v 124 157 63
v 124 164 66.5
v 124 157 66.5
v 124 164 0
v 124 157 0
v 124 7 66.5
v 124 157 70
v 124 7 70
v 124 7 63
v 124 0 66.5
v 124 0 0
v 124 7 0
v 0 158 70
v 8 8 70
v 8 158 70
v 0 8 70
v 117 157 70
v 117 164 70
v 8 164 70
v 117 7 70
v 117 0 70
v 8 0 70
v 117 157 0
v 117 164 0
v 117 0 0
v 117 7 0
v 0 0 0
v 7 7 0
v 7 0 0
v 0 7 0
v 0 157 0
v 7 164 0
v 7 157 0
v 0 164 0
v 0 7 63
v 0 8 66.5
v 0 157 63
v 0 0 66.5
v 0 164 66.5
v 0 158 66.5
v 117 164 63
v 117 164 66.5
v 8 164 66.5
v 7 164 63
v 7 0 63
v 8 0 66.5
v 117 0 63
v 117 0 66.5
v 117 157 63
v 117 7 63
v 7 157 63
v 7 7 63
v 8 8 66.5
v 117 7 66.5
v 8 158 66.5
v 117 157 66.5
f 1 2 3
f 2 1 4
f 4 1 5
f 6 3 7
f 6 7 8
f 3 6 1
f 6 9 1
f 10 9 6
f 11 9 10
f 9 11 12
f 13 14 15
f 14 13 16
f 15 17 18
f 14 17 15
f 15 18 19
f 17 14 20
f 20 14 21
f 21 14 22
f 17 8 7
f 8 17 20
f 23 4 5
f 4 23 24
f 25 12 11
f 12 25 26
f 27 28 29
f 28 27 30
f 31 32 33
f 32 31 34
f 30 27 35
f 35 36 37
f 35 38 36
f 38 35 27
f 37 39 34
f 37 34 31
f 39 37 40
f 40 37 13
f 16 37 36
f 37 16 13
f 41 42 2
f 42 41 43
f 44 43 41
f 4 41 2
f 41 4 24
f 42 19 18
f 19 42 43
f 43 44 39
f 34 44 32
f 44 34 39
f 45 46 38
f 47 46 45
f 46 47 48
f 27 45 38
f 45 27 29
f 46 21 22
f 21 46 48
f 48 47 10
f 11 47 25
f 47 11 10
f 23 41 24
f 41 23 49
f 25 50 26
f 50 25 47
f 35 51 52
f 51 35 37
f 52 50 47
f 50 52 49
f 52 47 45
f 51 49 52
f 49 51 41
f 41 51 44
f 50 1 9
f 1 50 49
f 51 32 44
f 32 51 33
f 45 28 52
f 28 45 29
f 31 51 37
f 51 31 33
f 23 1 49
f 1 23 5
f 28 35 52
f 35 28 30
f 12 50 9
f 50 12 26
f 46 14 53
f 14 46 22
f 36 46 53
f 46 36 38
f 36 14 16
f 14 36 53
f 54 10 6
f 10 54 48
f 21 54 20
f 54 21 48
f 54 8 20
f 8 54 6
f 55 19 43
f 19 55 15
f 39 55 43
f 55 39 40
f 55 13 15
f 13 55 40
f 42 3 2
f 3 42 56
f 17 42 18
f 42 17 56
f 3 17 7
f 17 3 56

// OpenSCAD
BoxZ=70;
BoxY=150;
BoxX=110;
Wall=7;
DW=Wall*2;
QW=Wall*4;

difference()
{
  cube([BoxX+DW,BoxY+DW,BoxZ]);
  translate([Wall,-Wall,-Wall]) cube([BoxX,BoxY+QW,BoxZ]);
  translate([-Wall,Wall,-Wall]) cube([BoxX+QW,BoxY,BoxZ]);
  translate([0,-Wall+1,BoxZ-Wall/2]) cube([Wall+1,DW,DW]);
  translate([BoxX+Wall,-Wall,BoxZ-Wall/2]) cube([DW,DW,DW]);
  translate([0,BoxY+Wall+1,BoxZ-Wall/2]) cube([Wall+1,DW,DW]);
  translate([BoxX+Wall,BoxY+Wall,BoxZ-Wall/2]) cube([DW,DW,DW]);
}
